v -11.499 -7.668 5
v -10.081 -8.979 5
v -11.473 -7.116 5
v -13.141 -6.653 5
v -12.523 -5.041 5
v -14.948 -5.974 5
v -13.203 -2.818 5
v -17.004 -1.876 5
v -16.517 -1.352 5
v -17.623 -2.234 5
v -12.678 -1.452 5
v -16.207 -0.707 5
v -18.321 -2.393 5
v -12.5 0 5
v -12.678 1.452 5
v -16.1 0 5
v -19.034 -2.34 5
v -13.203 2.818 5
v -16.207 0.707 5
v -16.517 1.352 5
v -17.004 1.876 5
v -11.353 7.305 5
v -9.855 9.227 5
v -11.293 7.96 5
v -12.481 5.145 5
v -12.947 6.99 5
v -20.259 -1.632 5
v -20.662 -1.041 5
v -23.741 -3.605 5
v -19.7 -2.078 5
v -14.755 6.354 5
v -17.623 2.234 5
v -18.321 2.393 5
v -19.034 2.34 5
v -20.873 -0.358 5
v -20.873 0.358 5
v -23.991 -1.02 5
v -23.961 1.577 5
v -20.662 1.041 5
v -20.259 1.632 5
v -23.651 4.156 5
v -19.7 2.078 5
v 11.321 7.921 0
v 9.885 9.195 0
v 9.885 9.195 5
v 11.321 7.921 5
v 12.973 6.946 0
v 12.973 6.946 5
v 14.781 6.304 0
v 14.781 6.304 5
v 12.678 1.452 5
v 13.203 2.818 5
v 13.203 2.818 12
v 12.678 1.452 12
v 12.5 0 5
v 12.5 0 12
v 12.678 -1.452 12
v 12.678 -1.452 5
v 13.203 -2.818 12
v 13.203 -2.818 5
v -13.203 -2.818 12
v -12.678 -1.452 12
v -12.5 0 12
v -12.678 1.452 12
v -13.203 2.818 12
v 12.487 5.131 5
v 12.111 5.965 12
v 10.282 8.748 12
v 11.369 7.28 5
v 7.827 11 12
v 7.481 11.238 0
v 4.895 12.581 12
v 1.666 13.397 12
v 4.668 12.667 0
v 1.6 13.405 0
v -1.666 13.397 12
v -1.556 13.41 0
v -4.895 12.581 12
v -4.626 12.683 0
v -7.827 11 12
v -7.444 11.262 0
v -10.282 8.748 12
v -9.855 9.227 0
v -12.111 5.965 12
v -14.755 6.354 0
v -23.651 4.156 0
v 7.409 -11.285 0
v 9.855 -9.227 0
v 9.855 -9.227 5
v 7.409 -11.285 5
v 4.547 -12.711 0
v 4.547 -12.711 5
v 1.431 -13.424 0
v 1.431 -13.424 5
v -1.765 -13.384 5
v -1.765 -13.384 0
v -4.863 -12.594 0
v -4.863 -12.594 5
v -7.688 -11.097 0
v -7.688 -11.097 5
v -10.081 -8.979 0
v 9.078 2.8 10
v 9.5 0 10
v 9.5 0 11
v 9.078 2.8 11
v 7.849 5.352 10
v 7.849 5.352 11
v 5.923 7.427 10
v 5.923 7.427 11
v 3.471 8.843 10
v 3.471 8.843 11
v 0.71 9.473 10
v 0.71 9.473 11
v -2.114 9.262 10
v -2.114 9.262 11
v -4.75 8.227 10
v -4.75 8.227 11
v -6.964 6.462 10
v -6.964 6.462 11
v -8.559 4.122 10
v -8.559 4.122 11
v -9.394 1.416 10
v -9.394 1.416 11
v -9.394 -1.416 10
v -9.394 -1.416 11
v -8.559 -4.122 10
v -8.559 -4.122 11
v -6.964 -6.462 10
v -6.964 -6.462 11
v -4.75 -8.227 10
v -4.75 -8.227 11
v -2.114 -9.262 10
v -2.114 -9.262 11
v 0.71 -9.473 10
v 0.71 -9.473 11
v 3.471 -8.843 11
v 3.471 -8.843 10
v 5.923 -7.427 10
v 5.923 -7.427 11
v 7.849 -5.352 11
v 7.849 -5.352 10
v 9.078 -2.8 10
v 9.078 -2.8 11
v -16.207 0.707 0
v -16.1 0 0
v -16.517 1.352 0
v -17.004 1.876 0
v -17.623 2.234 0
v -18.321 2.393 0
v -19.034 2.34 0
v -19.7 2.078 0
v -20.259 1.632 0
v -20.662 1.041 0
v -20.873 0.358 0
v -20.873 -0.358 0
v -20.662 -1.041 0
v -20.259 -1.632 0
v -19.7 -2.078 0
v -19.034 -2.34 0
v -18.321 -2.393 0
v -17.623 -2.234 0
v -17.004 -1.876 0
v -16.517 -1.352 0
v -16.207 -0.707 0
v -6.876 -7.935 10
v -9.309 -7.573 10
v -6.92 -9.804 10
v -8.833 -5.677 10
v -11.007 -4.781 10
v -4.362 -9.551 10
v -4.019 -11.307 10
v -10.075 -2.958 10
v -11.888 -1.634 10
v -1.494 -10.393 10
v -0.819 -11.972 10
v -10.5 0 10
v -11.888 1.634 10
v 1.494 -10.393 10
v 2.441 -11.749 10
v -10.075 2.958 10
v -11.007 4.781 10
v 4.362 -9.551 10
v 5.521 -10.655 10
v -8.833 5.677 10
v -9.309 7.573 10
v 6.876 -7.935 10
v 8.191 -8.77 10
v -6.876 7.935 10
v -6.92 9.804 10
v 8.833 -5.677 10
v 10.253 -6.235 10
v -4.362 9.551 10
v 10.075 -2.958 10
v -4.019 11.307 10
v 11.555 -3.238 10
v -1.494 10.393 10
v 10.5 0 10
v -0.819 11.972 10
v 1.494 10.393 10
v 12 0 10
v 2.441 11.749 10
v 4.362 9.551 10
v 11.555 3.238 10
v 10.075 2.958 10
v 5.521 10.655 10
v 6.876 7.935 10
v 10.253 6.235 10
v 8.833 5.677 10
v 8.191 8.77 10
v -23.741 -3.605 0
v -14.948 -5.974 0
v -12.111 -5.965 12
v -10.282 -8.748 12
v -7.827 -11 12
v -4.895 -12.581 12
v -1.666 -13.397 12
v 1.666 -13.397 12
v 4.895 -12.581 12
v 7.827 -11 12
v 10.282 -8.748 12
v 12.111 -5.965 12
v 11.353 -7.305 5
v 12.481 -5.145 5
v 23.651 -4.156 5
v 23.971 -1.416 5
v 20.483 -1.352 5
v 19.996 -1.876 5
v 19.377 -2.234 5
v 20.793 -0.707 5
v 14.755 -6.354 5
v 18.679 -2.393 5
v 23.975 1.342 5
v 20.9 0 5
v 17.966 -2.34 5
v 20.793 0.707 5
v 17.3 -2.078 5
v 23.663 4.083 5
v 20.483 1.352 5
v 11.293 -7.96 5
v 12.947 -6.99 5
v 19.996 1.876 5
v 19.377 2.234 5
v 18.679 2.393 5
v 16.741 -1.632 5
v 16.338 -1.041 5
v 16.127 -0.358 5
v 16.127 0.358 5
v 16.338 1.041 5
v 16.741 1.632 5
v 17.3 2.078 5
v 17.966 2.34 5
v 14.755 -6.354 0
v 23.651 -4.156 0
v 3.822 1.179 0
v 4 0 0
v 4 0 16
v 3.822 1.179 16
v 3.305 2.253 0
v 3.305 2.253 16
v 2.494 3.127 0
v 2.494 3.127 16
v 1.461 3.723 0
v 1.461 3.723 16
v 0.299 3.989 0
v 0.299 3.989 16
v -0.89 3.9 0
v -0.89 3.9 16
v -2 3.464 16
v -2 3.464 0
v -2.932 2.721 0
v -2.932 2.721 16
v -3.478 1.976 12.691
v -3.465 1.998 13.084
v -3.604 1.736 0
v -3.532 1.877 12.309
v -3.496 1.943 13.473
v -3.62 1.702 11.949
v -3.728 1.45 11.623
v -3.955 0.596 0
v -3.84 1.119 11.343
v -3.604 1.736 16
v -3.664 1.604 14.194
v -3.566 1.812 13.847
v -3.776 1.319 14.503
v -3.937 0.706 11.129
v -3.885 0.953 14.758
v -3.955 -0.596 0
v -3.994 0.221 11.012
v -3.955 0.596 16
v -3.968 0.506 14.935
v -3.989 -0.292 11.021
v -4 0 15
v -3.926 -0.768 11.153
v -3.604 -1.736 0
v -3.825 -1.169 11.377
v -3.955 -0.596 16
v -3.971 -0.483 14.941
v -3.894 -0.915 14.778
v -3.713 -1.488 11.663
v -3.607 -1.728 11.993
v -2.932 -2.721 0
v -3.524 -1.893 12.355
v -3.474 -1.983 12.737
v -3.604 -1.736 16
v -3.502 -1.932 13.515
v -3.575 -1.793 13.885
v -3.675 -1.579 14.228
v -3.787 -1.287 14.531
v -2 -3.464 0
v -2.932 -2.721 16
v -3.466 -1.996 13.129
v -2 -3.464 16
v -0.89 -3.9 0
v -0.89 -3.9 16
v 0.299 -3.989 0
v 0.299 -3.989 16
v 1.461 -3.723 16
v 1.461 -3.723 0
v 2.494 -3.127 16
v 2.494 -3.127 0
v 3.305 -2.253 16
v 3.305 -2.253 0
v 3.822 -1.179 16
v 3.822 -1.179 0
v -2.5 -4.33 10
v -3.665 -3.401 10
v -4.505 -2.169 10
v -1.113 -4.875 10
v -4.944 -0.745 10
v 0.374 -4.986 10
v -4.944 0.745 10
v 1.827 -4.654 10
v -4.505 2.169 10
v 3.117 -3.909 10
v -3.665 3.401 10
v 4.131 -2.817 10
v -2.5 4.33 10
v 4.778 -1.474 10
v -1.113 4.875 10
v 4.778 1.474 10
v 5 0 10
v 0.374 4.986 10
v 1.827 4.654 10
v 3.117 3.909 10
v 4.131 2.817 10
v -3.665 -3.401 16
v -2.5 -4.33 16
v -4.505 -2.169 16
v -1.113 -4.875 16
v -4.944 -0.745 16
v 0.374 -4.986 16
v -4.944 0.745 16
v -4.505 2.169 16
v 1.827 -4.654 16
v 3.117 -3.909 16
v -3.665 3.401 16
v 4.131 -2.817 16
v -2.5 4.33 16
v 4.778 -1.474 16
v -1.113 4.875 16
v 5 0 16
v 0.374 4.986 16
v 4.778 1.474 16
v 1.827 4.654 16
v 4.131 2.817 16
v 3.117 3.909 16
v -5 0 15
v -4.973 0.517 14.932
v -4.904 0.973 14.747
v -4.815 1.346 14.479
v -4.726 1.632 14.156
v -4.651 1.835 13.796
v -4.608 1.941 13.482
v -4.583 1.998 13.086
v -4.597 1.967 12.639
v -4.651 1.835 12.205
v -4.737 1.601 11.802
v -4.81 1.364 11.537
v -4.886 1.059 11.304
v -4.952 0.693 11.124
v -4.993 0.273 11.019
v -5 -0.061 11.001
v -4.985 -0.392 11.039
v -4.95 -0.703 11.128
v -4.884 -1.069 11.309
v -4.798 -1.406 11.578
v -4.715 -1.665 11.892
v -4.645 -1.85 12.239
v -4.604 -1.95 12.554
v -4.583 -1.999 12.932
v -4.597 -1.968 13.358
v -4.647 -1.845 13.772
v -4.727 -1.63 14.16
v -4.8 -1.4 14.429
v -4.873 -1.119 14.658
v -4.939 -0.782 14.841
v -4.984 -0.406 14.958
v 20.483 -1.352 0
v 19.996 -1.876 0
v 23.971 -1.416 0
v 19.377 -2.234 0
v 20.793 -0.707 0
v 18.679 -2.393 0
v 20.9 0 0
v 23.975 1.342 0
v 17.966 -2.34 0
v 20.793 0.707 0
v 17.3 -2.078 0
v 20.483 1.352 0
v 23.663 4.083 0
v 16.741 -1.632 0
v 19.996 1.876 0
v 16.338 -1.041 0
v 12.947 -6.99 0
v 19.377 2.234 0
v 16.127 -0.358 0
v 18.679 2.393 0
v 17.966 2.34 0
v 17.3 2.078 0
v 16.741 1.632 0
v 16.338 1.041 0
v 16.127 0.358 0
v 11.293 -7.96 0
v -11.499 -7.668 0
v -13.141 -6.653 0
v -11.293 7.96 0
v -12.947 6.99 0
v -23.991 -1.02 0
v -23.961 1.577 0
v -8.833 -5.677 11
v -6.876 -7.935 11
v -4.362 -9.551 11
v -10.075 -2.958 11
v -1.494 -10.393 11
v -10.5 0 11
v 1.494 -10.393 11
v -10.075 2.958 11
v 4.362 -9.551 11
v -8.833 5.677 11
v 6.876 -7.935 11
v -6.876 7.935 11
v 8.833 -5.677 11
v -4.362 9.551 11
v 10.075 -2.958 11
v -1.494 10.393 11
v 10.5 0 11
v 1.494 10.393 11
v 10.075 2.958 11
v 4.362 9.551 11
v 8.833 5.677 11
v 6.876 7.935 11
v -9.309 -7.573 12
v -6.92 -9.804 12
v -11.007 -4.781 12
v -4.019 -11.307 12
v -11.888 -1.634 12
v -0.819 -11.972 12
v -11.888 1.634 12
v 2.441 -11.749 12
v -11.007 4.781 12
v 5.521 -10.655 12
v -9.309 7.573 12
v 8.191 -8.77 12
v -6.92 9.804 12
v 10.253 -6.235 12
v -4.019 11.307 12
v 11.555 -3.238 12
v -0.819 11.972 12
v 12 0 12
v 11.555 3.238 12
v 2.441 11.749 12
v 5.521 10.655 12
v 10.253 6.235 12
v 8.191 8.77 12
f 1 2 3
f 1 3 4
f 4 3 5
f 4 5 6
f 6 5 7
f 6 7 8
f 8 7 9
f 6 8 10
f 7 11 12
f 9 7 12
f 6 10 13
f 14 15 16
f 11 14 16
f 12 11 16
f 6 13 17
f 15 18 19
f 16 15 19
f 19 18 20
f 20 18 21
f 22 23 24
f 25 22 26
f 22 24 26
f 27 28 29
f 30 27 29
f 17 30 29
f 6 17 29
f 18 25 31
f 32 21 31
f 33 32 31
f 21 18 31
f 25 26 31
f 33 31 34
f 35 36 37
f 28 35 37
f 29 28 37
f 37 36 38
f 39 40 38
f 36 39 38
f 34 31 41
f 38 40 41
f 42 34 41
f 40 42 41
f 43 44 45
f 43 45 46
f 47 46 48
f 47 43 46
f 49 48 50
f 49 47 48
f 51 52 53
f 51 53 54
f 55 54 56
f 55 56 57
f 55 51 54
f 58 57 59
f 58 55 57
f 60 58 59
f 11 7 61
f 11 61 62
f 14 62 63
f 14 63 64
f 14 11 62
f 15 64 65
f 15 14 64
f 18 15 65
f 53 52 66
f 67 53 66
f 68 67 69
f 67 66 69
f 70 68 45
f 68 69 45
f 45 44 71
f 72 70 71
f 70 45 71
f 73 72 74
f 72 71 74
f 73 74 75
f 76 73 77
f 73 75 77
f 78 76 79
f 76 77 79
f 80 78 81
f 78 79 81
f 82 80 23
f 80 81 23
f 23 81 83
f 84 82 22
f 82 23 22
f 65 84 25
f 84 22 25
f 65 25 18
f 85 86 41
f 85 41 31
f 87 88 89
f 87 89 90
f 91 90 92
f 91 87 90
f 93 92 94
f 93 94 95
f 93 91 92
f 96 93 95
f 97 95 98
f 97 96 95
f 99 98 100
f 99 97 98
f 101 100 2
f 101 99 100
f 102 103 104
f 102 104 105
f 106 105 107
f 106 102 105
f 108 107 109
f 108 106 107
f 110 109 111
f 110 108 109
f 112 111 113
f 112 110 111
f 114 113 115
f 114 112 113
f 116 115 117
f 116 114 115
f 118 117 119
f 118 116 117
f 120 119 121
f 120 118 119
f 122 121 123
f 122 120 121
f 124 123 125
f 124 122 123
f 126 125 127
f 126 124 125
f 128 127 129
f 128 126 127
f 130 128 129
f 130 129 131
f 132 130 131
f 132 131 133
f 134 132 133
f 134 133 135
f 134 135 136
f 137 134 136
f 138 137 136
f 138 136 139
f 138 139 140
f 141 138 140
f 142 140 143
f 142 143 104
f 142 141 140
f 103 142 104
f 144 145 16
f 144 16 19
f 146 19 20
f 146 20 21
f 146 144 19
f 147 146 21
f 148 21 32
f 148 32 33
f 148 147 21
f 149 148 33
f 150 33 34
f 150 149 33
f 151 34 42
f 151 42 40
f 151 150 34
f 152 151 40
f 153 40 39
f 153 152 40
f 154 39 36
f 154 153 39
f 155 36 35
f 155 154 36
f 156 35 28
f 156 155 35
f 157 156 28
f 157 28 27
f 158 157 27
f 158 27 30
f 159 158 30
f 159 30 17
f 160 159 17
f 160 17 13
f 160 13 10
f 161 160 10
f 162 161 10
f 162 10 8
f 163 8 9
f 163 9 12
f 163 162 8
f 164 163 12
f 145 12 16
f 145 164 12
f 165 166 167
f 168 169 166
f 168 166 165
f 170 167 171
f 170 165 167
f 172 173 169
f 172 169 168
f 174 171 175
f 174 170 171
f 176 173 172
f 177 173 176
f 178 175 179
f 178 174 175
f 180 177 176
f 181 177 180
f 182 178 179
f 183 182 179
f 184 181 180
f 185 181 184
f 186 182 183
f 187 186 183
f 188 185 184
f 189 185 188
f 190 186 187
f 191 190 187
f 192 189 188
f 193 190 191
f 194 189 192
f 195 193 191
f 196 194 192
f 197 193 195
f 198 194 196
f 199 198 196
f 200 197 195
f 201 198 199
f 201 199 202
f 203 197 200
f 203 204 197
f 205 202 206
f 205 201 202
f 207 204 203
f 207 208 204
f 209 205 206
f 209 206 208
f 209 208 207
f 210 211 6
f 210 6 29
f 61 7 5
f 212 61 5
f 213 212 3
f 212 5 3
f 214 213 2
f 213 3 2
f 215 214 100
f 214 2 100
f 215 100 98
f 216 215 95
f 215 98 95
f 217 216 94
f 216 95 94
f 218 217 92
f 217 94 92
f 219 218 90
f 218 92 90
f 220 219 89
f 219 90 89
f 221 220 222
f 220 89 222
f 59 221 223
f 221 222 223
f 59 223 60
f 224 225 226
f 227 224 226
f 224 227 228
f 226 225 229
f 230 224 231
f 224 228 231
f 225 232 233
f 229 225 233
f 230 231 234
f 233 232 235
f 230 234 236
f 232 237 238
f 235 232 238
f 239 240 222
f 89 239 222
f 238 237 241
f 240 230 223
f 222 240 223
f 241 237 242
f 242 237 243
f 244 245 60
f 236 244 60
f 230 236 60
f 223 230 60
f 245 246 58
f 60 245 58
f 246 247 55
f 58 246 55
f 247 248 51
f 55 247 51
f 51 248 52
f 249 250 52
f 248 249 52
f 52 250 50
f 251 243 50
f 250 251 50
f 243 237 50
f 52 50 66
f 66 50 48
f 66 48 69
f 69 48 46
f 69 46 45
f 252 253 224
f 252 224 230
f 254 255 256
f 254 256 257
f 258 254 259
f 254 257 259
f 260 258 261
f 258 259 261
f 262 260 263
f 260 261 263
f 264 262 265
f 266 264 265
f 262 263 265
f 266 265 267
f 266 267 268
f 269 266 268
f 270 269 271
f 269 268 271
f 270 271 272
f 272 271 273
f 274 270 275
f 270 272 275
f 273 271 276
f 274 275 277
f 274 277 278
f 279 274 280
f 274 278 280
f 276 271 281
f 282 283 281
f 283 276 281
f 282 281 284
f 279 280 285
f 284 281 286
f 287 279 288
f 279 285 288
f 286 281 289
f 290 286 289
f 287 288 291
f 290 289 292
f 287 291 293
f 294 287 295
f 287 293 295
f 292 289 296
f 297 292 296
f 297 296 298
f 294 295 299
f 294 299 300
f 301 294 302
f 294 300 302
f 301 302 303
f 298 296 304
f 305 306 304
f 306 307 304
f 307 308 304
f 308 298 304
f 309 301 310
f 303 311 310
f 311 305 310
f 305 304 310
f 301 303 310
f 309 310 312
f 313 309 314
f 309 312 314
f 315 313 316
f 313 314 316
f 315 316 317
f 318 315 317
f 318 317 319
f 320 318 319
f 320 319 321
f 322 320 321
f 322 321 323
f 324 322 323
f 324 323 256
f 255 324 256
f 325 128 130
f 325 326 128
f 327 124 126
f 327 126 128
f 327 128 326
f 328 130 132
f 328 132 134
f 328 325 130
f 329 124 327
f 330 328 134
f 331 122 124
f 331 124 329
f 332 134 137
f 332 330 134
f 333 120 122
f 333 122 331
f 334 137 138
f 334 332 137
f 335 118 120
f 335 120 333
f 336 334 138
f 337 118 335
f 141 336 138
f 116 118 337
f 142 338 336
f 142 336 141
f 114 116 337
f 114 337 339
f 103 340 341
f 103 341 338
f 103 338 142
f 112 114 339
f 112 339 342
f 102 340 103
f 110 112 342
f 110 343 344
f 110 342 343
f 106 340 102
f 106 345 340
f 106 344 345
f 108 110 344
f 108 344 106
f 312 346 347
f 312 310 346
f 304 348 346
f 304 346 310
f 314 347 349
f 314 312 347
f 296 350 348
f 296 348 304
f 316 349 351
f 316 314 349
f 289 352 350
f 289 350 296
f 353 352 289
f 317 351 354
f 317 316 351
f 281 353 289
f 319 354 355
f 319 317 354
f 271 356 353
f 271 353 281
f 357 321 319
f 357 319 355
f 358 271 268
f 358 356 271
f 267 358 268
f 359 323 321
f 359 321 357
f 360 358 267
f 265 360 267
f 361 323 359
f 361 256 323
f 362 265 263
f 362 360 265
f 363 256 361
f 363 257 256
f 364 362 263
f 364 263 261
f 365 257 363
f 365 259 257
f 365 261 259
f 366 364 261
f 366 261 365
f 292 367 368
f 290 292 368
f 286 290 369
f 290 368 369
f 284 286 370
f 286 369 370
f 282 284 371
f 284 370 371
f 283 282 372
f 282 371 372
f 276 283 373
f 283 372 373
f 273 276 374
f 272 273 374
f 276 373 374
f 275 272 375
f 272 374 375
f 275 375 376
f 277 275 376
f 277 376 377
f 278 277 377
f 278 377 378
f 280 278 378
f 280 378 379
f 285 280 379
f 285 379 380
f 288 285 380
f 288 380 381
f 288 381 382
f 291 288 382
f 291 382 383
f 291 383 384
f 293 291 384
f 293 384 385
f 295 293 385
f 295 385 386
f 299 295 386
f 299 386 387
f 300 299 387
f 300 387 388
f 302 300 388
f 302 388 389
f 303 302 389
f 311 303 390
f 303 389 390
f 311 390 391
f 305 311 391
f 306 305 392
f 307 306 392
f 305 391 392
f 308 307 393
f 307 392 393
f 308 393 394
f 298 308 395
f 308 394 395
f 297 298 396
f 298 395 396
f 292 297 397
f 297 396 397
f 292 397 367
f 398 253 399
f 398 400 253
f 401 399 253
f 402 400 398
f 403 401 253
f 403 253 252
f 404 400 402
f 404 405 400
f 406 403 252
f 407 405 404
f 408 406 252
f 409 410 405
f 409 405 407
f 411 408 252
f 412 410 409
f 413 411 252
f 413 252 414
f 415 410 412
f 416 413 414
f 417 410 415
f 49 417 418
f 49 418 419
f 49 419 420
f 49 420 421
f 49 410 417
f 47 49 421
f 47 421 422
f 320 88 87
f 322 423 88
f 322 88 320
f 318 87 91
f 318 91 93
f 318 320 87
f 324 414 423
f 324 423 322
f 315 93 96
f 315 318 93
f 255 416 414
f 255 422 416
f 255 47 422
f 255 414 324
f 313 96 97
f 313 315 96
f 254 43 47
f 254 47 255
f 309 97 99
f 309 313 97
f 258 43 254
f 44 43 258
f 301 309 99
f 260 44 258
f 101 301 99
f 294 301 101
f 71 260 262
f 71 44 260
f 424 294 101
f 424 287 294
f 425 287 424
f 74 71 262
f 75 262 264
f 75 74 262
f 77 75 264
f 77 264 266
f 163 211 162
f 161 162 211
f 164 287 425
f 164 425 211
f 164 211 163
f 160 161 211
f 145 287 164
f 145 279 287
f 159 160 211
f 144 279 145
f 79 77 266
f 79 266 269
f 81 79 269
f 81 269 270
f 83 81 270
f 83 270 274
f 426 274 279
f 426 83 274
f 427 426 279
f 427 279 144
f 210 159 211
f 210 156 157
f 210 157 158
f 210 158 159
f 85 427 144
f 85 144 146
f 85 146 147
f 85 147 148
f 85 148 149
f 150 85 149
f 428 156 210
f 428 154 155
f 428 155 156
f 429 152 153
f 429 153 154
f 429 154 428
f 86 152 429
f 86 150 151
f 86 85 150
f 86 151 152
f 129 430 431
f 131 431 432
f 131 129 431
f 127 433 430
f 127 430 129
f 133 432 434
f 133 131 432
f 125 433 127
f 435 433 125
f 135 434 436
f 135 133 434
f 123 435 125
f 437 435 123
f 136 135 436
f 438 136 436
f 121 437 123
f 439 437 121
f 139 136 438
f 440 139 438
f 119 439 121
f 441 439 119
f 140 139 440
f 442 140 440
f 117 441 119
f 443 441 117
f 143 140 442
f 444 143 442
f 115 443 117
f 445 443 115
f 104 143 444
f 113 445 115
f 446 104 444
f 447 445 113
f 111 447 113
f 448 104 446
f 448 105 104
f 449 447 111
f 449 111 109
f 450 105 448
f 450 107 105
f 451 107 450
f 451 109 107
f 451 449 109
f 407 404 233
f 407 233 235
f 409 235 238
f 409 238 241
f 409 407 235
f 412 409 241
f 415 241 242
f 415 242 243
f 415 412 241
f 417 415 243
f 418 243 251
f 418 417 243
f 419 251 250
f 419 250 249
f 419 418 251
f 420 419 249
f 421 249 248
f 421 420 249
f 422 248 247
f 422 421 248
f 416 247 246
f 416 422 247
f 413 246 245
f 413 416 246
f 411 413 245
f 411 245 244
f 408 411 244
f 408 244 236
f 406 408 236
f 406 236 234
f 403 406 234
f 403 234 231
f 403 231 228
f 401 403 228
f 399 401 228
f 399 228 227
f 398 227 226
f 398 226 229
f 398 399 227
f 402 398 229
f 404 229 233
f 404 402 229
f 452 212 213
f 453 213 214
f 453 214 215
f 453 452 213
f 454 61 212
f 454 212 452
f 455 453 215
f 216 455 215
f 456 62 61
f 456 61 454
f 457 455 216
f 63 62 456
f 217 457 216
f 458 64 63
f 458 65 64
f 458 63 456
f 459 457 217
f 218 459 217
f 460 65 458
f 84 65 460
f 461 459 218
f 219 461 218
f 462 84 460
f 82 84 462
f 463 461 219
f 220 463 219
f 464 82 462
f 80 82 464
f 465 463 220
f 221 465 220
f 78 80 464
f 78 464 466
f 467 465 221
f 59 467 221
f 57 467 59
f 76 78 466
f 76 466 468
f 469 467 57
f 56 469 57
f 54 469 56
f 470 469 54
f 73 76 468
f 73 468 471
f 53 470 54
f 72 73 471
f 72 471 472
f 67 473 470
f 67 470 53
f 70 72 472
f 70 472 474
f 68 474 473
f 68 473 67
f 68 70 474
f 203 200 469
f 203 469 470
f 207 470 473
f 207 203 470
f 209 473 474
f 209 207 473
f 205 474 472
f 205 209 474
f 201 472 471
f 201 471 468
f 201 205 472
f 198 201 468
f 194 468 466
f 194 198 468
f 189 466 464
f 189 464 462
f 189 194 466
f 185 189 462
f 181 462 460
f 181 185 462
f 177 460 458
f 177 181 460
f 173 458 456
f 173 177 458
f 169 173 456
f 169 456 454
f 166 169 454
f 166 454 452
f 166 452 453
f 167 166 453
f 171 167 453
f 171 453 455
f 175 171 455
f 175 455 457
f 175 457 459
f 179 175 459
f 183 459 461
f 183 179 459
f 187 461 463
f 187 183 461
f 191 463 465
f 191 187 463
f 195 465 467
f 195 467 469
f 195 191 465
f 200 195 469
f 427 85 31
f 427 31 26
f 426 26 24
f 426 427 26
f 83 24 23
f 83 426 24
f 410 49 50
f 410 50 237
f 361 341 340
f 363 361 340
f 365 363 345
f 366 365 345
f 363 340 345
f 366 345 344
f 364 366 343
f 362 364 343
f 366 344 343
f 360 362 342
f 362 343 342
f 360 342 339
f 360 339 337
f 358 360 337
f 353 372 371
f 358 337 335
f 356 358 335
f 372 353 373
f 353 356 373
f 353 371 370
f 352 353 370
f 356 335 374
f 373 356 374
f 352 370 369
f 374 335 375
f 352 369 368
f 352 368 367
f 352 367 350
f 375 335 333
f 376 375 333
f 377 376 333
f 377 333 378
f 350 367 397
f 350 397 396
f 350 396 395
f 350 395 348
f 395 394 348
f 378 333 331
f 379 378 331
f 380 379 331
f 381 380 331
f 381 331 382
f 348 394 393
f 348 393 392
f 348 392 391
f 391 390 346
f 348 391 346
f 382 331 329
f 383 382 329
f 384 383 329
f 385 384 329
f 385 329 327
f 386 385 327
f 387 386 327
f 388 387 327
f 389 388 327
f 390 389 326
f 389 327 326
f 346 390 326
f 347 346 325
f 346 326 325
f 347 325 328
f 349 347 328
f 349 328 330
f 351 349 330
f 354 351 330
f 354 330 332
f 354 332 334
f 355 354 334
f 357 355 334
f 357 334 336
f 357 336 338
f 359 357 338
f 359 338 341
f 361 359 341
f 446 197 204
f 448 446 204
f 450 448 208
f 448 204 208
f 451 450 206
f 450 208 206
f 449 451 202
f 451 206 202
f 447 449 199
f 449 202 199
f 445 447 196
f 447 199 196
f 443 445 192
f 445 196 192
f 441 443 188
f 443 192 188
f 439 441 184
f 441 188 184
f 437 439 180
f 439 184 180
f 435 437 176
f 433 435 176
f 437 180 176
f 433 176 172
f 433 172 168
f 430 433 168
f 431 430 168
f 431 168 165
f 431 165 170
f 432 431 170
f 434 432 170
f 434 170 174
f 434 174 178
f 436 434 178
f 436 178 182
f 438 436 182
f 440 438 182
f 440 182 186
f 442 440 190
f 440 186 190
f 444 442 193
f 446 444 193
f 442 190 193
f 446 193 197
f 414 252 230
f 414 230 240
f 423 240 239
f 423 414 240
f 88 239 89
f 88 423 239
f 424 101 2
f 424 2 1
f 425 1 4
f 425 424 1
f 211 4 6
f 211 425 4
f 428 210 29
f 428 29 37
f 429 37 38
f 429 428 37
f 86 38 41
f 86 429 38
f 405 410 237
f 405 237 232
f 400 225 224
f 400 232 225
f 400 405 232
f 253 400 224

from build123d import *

# Parameters (mm, degrees)
SKETCH_1_R          = 2.4
EXTRUDE_1_DEPTH     = 5
SKETCH_2_R          = 13.5
EXTRUDE_2_DEPTH     = 5
SKETCH_3_R          = 13.5
SKETCH_3_R_2        = 12
EXTRUDE_3_DEPTH     = 2
SKETCH_4_R          = 5
SKETCH_4_R_2        = 4
EXTRUDE_4_DEPTH     = 6
SKETCH_5_R          = 6
CUT_EXTRUDE_1_DEPTH = 7
SKETCH_6_R          = 4
CUT_EXTRUDE_2_DEPTH = 13
SKETCH_7_R          = 10.5
SKETCH_7_R_2        = 9.5
EXTRUDE_5_DEPTH     = 1
SKETCH_8_R          = 2
CUT_EXTRUDE_3_DEPTH = 3


with BuildPart() as part:
    # 草图1 → 凸台-拉伸1 (new body)
    with BuildSketch(Plane.XY):
        with BuildLine():
            Line((-23.650515621, 4.155817481), (-14.755275826, 6.353883931))
            ThreePointArc((-14.755275826, 6.353883931), (-12.096586798, 7.435137426), (-9.854528975, 9.227039541))
            ThreePointArc((-9.854528975, 9.227039541), (0.022244584, 13.499981673), (9.884883075, 9.19451394))
            ThreePointArc((9.884883075, 9.19451394), (12.1232727, 7.393904675), (14.781202624, 6.30395497))
            Line((14.781202624, 6.30395497), (23.663193746, 4.083009896))
            ThreePointArc((23.663193746, 4.083009896), (24.012837039, -0.036951588), (23.650515621, -4.155817481))
            Line((23.650515621, -4.155817481), (14.755275826, -6.353883931))
            ThreePointArc((14.755275826, -6.353883931), (12.096586798, -7.435137426), (9.854528975, -9.227039541))
            ThreePointArc((9.854528975, -9.227039541), (-0.168191571, -13.498952241), (-10.081364571, -8.978646244))
            ThreePointArc((-10.081364571, -8.978646244), (-12.295346053, -7.120754011), (-14.948193848, -5.973637572))
            Line((-14.948193848, -5.973637572), (-23.740665236, -3.605346339))
            ThreePointArc((-23.740665236, -3.605346339), (-24.011245735, 0.278902058), (-23.650515621, 4.155817481))
        make_face()
        with Locations((18.5, 0)):
            Circle(SKETCH_1_R, mode=Mode.SUBTRACT)
        with Locations((-18.5, 0)):
            Circle(SKETCH_1_R, mode=Mode.SUBTRACT)
    extrude(amount=EXTRUDE_1_DEPTH)

    # 草图2 → 凸台-拉伸2 (add)
    with BuildSketch(Plane.XY.offset(5)):
        Circle(SKETCH_2_R)
    extrude(amount=EXTRUDE_2_DEPTH)

    # 草图3 → 凸台-拉伸3 (add)
    with BuildSketch(Plane.XY.offset(10)):
        Circle(SKETCH_3_R)
        Circle(SKETCH_3_R_2, mode=Mode.SUBTRACT)
    extrude(amount=EXTRUDE_3_DEPTH)

    # 草图4 → 凸台-拉伸4 (add)
    with BuildSketch(Plane.XY.offset(10)):
        Circle(SKETCH_4_R)
        Circle(SKETCH_4_R_2, mode=Mode.SUBTRACT)
    extrude(amount=EXTRUDE_4_DEPTH)

    # 草图5 → 切除-拉伸1 (cut)
    with BuildSketch(Plane.XY.offset(5)):
        with Locations((-18.5, 0)):
            Circle(SKETCH_5_R)
        with Locations((18.5, 0)):
            Circle(SKETCH_5_R)
    extrude(amount=CUT_EXTRUDE_1_DEPTH, mode=Mode.SUBTRACT)

    # 草图6 → 切除-拉伸2 (cut)
    with BuildSketch(Plane.XY.offset(10)):
        Circle(SKETCH_6_R)
    extrude(amount=-CUT_EXTRUDE_2_DEPTH, mode=Mode.SUBTRACT)

    # 草图7 → 凸台-拉伸5 (add)
    with BuildSketch(Plane.XY.offset(10)):
        Circle(SKETCH_7_R)
        Circle(SKETCH_7_R_2, mode=Mode.SUBTRACT)
    extrude(amount=EXTRUDE_5_DEPTH)

    # 草图8 → 切除-拉伸3 (cut)
    with BuildSketch(Plane.ZY.offset(5)):
        with Locations((13, 0)):
            Circle(SKETCH_8_R)
    extrude(amount=-CUT_EXTRUDE_3_DEPTH, mode=Mode.SUBTRACT)


solid = part.part
